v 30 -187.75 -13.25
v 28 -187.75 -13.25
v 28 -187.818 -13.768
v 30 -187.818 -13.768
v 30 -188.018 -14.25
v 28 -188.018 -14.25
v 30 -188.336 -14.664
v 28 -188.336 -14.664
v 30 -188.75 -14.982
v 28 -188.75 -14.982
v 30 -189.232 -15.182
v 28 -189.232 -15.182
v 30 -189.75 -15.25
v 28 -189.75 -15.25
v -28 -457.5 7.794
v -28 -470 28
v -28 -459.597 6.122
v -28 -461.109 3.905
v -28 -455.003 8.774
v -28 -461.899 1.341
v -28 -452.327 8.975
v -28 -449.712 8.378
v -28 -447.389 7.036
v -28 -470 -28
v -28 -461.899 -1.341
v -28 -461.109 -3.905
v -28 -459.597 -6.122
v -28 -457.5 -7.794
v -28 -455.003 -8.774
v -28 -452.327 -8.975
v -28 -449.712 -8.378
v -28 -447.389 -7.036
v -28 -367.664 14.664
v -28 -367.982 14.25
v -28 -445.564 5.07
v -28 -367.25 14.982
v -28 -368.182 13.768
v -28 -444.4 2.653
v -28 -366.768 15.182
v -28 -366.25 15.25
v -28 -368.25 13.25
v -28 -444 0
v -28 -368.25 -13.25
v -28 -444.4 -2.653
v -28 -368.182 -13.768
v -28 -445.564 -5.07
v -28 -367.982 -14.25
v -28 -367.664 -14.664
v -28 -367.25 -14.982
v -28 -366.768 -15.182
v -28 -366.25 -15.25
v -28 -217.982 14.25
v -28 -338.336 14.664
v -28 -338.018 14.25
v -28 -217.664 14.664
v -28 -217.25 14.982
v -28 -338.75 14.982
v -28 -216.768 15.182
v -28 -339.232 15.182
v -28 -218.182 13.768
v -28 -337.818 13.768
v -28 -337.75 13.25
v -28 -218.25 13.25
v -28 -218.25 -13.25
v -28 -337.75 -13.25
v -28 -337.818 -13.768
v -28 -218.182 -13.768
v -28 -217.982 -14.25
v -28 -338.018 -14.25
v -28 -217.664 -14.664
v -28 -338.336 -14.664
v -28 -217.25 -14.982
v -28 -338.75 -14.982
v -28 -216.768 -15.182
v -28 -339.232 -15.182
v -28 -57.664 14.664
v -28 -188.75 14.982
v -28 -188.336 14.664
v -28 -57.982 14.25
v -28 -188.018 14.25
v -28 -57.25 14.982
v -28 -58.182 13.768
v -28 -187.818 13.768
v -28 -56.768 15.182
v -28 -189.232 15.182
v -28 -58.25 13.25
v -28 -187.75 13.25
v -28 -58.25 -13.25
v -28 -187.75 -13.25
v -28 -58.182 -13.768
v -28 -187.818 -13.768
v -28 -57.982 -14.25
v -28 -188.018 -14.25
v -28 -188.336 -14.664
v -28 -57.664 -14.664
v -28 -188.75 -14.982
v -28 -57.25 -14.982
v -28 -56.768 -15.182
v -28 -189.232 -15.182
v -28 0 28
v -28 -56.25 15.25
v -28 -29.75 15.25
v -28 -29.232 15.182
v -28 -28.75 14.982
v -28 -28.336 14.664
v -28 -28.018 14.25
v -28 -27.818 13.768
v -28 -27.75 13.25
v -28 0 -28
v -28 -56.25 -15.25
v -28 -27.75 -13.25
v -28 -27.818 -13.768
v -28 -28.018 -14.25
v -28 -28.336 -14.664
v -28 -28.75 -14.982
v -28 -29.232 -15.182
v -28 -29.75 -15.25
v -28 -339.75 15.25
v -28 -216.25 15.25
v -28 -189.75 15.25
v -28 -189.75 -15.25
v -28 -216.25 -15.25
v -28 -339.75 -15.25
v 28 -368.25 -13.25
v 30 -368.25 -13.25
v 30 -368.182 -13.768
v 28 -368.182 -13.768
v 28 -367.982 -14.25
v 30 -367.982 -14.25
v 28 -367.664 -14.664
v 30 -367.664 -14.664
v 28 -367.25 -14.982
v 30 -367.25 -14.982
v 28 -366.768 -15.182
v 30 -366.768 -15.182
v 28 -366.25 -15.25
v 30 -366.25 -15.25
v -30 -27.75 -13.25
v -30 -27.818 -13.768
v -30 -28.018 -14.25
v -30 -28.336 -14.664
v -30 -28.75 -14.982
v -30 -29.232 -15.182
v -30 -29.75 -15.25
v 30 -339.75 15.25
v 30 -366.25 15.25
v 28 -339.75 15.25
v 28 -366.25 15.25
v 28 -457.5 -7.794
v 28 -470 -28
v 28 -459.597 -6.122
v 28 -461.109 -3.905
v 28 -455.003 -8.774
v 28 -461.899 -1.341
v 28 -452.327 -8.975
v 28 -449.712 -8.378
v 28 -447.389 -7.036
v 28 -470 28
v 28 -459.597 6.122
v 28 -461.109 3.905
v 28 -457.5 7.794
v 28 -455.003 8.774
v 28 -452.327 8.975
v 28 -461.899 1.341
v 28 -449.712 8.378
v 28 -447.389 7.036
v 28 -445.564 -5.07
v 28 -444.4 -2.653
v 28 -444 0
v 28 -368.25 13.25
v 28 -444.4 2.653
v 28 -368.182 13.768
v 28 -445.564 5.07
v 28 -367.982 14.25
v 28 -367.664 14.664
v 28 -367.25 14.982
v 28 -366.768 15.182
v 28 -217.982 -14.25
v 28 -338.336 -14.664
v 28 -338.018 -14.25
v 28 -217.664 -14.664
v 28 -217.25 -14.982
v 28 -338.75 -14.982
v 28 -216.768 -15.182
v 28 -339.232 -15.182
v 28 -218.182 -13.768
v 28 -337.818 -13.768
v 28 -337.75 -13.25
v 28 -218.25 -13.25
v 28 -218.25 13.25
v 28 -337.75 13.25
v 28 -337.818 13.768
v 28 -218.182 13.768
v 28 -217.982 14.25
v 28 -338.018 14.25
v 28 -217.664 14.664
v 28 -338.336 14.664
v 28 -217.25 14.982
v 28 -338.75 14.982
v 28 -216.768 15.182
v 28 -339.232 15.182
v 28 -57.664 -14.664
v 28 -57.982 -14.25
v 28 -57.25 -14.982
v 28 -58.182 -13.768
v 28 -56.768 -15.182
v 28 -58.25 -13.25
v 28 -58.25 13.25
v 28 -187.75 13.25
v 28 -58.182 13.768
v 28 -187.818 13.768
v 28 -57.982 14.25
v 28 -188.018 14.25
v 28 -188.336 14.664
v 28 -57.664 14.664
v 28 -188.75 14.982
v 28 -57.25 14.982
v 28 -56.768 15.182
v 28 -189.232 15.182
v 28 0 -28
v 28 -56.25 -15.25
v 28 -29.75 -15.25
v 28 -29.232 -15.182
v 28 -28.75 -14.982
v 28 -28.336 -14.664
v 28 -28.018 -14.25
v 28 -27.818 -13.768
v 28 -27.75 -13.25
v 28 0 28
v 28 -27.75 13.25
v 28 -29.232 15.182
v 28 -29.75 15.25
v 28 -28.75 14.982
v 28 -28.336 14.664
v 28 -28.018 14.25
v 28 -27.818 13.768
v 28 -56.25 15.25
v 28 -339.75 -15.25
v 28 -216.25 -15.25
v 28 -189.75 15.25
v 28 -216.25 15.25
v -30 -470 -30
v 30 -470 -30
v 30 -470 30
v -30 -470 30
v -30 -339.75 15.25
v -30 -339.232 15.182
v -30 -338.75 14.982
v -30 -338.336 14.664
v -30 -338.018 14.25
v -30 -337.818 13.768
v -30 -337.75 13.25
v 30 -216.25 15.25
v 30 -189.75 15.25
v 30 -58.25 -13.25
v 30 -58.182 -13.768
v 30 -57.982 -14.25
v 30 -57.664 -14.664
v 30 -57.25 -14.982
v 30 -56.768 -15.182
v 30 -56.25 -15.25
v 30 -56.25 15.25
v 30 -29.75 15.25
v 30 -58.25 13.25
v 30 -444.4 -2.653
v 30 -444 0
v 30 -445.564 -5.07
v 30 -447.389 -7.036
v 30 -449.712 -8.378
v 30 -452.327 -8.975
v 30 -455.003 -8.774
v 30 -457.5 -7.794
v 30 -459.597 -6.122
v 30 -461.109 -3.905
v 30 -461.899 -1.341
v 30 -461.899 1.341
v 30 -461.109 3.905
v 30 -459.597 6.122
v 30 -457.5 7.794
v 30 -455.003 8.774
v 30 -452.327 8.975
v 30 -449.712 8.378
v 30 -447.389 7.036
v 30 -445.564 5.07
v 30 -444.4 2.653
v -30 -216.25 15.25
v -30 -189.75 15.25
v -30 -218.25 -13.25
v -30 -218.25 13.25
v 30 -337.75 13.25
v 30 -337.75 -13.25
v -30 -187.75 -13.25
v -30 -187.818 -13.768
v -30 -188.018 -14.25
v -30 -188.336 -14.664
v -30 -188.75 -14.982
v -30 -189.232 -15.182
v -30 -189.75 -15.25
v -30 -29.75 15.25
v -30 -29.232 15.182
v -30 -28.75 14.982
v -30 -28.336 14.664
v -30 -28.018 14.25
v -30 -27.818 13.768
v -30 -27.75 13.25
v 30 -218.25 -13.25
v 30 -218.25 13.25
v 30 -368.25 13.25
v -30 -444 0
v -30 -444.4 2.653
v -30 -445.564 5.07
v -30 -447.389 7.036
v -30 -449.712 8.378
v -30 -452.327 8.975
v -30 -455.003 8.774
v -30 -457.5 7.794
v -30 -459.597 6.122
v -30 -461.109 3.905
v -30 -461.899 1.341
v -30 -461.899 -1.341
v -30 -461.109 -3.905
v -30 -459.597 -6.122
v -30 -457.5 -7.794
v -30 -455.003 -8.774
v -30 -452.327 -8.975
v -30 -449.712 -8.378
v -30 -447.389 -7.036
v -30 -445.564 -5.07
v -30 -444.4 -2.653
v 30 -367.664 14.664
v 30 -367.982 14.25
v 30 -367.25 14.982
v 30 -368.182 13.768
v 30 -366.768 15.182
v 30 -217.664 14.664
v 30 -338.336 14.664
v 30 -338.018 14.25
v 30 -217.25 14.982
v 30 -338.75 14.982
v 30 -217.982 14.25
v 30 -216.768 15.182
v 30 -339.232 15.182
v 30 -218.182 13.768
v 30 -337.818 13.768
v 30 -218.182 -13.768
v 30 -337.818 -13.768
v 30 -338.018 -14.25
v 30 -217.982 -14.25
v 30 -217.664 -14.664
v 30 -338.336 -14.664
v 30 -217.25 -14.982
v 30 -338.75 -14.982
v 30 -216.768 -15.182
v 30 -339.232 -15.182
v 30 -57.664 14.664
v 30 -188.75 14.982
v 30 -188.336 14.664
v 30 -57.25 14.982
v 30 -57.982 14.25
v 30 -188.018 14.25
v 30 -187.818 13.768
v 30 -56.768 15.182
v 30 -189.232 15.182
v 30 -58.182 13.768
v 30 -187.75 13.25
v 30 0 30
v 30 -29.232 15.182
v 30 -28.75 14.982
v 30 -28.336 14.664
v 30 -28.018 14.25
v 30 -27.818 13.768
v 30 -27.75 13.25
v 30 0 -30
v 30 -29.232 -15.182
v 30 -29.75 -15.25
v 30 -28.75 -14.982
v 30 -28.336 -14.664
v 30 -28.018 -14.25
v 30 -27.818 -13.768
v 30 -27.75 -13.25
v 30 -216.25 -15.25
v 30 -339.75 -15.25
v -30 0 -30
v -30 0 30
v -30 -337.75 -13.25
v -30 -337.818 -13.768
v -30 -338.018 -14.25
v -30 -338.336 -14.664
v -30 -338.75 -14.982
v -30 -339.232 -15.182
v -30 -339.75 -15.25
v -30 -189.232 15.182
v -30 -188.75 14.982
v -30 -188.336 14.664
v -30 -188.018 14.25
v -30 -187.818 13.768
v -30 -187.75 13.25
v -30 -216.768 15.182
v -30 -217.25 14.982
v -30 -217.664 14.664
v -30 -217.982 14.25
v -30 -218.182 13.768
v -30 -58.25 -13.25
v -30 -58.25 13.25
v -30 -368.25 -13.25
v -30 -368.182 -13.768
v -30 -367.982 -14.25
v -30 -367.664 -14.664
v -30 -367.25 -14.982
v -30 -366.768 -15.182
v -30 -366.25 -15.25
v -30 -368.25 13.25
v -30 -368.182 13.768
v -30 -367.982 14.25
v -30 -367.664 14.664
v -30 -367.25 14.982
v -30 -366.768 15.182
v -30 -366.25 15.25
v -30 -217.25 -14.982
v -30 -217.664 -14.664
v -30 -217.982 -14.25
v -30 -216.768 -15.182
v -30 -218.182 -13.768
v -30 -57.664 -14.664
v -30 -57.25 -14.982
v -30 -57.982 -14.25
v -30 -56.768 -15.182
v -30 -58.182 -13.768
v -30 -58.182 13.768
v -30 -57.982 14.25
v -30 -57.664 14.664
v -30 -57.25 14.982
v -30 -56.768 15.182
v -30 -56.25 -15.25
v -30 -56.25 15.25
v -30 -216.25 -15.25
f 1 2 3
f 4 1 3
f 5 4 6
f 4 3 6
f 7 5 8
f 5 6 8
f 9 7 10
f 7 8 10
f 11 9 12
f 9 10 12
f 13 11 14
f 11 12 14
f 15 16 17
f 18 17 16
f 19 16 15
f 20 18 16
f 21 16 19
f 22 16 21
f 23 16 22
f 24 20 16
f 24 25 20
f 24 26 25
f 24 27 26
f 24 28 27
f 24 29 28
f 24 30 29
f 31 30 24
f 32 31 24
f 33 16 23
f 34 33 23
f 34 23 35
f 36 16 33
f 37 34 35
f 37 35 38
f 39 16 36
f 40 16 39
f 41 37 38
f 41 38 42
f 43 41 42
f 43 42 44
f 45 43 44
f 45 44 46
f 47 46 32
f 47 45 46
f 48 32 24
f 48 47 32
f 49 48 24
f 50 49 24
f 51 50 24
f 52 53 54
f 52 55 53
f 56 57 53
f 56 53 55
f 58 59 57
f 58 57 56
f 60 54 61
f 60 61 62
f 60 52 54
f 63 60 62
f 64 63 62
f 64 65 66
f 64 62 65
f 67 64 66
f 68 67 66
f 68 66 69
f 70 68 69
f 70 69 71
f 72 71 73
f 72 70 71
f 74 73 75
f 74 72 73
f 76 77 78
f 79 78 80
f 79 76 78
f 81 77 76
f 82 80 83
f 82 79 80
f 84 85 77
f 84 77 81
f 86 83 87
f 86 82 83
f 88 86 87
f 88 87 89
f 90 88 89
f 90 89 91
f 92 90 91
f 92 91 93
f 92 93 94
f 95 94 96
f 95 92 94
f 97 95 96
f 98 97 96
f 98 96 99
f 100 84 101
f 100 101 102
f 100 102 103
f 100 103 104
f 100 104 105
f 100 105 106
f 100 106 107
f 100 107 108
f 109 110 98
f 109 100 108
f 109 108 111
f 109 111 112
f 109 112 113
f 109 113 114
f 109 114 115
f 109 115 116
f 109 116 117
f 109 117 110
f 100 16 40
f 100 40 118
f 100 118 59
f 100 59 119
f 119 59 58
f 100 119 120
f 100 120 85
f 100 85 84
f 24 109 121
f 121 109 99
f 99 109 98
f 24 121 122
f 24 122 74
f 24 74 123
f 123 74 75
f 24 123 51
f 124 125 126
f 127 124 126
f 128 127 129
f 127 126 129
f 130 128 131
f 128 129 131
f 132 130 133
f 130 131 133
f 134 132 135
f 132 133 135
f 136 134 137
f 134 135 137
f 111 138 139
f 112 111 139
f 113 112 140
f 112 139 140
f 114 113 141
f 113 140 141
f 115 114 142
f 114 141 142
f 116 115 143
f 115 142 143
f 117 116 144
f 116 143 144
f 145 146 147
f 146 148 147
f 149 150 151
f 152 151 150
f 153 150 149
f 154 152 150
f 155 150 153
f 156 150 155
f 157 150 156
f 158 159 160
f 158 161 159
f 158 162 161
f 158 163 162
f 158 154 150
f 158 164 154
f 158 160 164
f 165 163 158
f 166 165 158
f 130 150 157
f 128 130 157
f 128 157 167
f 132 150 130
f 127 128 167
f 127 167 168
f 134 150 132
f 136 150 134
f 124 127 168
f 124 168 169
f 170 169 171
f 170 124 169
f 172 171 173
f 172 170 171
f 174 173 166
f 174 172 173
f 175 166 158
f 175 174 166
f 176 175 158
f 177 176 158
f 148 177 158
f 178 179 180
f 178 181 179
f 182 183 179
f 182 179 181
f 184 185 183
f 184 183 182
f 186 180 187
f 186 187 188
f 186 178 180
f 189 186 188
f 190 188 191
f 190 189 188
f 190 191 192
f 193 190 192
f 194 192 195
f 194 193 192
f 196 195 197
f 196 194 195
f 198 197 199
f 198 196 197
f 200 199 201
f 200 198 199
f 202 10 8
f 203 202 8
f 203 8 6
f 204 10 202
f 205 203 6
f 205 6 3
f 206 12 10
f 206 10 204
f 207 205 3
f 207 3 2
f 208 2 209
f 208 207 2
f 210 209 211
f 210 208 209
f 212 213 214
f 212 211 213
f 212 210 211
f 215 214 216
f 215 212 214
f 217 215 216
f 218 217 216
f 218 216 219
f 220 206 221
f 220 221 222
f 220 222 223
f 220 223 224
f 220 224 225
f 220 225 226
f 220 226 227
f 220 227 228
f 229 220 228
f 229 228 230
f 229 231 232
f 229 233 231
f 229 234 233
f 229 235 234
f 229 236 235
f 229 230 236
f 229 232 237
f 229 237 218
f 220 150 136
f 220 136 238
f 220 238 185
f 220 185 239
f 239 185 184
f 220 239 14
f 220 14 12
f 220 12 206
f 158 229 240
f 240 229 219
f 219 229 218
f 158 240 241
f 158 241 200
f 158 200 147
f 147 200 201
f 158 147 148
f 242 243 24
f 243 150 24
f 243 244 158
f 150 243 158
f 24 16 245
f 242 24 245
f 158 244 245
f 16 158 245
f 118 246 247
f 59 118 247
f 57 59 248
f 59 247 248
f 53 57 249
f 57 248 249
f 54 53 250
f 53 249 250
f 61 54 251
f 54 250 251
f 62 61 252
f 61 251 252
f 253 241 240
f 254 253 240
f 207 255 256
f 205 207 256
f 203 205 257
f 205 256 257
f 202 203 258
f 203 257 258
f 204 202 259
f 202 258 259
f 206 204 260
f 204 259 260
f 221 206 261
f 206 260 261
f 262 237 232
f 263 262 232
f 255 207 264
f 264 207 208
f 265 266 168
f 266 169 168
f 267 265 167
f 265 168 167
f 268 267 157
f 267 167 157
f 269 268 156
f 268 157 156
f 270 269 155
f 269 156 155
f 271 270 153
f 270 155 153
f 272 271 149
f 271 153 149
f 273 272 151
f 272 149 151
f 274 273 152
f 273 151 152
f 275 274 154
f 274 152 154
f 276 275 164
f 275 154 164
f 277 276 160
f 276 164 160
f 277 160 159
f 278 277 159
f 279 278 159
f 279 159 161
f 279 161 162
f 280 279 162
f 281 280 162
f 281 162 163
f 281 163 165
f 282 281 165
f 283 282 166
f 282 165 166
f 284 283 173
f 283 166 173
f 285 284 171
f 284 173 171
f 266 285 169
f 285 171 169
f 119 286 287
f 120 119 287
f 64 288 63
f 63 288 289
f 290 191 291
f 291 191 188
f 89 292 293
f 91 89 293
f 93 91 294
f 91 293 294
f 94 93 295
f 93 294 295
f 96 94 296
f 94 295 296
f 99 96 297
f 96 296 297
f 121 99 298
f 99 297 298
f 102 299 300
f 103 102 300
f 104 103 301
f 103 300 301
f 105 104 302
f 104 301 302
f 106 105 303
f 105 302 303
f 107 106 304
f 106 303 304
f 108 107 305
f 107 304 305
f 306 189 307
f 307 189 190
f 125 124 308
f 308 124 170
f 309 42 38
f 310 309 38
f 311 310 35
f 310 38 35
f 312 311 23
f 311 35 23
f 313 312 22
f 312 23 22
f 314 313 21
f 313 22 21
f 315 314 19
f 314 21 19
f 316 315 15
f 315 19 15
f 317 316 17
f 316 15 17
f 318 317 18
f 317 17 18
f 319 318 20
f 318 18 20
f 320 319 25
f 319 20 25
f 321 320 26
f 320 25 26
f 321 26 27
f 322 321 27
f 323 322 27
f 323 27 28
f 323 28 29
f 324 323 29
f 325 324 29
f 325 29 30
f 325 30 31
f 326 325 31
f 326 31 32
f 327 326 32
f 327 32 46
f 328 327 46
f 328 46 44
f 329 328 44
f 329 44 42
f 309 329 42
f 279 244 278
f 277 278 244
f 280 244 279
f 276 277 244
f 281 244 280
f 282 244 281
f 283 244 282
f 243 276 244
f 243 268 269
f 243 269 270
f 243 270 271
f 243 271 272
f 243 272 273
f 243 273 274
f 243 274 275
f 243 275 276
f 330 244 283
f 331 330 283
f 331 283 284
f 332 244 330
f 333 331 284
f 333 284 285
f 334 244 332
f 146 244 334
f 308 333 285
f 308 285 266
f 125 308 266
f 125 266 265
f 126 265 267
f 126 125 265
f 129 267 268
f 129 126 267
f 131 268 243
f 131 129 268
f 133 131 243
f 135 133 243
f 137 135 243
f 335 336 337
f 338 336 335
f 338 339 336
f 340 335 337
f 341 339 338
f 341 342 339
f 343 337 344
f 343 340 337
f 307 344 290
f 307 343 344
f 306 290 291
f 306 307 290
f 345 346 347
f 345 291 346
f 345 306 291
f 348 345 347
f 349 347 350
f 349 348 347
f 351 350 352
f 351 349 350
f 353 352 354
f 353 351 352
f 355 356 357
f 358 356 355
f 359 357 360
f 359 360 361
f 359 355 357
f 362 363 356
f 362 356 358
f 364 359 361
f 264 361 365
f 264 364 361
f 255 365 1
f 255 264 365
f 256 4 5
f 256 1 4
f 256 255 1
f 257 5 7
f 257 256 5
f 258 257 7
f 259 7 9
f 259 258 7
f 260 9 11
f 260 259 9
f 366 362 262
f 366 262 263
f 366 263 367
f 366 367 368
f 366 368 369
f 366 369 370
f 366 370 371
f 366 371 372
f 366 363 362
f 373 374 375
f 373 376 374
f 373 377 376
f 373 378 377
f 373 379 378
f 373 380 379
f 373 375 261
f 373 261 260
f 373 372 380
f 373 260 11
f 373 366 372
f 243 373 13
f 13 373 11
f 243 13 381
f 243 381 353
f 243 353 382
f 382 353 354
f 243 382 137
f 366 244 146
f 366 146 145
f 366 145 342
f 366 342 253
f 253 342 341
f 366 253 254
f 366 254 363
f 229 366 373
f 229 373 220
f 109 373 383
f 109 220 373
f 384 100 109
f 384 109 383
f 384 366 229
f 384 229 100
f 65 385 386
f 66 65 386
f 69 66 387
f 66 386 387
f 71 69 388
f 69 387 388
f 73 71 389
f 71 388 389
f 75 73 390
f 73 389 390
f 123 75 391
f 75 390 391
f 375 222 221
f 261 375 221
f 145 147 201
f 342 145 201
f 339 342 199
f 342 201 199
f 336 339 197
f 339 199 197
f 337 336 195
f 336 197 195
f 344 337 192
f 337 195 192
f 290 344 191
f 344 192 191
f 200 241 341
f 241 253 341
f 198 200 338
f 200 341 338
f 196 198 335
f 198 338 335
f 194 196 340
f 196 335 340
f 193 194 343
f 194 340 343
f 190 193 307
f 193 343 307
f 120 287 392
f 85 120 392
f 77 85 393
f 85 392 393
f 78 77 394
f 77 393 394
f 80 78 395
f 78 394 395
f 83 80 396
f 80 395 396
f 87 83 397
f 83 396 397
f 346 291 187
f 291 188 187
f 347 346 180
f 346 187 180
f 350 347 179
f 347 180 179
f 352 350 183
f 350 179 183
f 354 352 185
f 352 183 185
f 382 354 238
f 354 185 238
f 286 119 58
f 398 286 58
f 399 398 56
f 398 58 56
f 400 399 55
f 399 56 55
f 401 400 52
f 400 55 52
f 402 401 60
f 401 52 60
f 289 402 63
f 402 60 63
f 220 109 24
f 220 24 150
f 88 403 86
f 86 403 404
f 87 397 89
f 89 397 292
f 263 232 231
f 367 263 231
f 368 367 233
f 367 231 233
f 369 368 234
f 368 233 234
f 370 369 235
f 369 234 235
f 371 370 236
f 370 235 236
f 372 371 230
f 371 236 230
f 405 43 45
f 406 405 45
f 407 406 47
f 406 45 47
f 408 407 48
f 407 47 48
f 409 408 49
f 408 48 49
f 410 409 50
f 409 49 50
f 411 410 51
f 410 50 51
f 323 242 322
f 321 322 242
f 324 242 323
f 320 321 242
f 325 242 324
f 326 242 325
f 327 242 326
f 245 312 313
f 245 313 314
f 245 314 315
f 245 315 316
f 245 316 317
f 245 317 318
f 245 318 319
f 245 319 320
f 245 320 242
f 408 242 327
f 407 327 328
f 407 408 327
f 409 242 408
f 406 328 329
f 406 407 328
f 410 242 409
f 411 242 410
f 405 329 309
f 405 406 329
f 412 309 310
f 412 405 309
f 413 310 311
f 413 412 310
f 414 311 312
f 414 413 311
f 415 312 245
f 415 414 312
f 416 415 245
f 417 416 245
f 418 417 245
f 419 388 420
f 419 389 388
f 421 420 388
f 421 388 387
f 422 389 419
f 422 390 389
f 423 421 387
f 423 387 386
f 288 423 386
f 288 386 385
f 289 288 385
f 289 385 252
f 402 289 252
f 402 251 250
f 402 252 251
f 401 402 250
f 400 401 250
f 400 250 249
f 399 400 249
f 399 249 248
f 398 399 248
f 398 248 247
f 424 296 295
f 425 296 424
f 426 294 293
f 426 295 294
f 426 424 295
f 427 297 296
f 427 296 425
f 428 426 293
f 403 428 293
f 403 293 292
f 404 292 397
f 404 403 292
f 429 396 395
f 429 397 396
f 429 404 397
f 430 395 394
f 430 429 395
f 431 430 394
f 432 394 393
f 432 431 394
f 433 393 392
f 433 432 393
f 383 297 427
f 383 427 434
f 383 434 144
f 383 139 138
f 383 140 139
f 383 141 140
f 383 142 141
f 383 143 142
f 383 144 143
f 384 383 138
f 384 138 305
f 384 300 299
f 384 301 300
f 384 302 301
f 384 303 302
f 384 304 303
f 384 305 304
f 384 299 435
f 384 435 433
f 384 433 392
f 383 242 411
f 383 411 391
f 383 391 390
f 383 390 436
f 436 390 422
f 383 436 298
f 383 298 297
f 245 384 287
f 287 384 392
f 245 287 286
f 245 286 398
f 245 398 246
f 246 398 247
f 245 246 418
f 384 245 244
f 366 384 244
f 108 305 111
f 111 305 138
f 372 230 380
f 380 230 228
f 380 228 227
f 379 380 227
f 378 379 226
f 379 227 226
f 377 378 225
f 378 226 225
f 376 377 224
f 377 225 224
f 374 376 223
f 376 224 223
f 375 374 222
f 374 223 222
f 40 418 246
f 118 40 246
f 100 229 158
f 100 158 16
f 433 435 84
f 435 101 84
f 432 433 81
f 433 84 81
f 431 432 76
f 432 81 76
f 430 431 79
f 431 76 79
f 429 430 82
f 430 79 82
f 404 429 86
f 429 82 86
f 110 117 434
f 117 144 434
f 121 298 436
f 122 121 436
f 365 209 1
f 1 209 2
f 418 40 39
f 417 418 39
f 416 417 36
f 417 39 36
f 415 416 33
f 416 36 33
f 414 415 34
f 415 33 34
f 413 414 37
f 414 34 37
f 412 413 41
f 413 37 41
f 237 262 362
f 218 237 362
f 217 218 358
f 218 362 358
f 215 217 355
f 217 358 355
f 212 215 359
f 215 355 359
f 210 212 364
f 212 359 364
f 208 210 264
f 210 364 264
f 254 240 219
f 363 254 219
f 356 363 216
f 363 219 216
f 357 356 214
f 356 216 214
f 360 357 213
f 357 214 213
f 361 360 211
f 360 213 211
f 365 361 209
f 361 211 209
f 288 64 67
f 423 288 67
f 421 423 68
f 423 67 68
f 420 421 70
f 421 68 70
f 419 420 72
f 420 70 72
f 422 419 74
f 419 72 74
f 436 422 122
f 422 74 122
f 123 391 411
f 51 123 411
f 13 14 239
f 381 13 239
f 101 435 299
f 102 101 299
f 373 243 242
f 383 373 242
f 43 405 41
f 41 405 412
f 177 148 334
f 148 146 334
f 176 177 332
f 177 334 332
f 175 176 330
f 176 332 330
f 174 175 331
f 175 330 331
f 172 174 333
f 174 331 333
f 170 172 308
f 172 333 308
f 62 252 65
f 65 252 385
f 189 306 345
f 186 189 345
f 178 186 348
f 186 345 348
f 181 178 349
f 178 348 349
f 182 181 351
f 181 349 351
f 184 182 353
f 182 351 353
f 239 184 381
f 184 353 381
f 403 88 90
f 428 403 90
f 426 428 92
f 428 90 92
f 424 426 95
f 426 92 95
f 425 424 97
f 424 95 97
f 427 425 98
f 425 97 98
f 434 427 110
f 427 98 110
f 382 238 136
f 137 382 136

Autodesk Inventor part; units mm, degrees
ref_plane "YZ Plane" through (0, 0, 0) normal (1, 0, 0) x (0, 1, 0)
ref_plane "XZ Plane" through (0, 0, 0) normal (0, 1, 0) x (-1, 0, 0)
ref_plane "XY Plane" through (0, 0, 0) normal (0, 0, 1) x (1, 0, 0)
sketch "Sketch9" plane through (0, 0, 0) normal (0, 1, 0) x (-1, 0, 0)
  line L0 (30, 30) -> (-30, 30)
  line L1 (-30, 30) -> (-30, -30)
  line L2 (-30, -30) -> (30, -30)
  line L3 (30, -30) -> (30, 30)
  line L4 (30, 30) -> (-30, -30) construction
  line L5 (-30, 30) -> (30, -30) construction
  line L6 (-28, 28) -> (28, 28)
  line L7 (28, 28) -> (28, -28)
  line L8 (28, -28) -> (-28, -28)
  line L9 (-28, -28) -> (-28, 28)
  point P0 (0, 0)
  dimension "d172" = 60
  dimension "d173" = 60
  dimension "d174" = 2
extrude "Extrusion3" add sketch "Sketch9" against normal blind 470
sketch "Sketch10" plane through (0, 0, 0) normal (1, 0, 0) x (0, 1, 0)
  line L0 (0, 30) -> (0, -30) construction
  line L1 (0, 30) -> (-470, 30) construction
  line L2 (-470, -30) -> (-470, 30) construction
  line L3 (0, -30) -> (-470, -30) construction
  line L4 (-58.25, 15.25) -> (-27.75, 15.25)
  line L5 (-27.75, 15.25) -> (-27.75, -15.25)
  line L6 (-27.75, -15.25) -> (-58.25, -15.25)
  line L7 (-58.25, -15.25) -> (-58.25, 15.25)
  line L8 (-58.25, 15.25) -> (-27.75, -15.25) construction
  line L9 (-27.75, 15.25) -> (-58.25, -15.25) construction
  line L10 (-218.25, 15.25) -> (-187.75, 15.25)
  line L11 (-187.75, 15.25) -> (-187.75, -15.25)
  line L12 (-187.75, -15.25) -> (-218.25, -15.25)
  line L13 (-218.25, -15.25) -> (-218.25, 15.25)
  line L14 (-218.25, 15.25) -> (-187.75, -15.25) construction
  line L15 (-187.75, 15.25) -> (-218.25, -15.25) construction
  line L16 (-368.25, 15.25) -> (-337.75, 15.25)
  line L17 (-337.75, 15.25) -> (-337.75, -15.25)
  line L18 (-337.75, -15.25) -> (-368.25, -15.25)
  line L19 (-368.25, -15.25) -> (-368.25, 15.25)
  line L20 (-368.25, 15.25) -> (-337.75, -15.25) construction
  line L21 (-337.75, 15.25) -> (-368.25, -15.25) construction
  circle A0 centre (-453, 0) radius 9
  line L22 (0, 0) -> (47, 0)
  point P0 (-43, 0)
  point P1 (-203, 0)
  point P2 (-353, 0)
  dimension "d177" = 30.5
  dimension "d178" = 30.5
  dimension "d181" = 47
  dimension "d182" = 90
  dimension "d183" = 250
  dimension "d184" = 400
  dimension "d185" = 500
  dimension "d186" = 18
extrude "Extrusion4" cut sketch "Sketch10" along normal through all both and the other way through all
sketch "Sketch11" plane through (30, 0, 30) normal (1, 0, 0) x (0, 0, -1)
  line L0 (45.25, -218.25) -> (14.75, -218.25) projected
  line L1 (14.75, -218.25) -> (14.75, -187.75) projected
  line L2 (14.75, -187.75) -> (45.25, -187.75) projected
  line L3 (45.25, -187.75) -> (45.25, -218.25) projected
  circle A0 centre (30, -453) radius 9 projected
  line L4 (45.25, -58.25) -> (14.75, -58.25) projected
  line L5 (14.75, -58.25) -> (14.75, -27.75) projected
  line L6 (14.75, -27.75) -> (45.25, -27.75) projected
  line L7 (45.25, -27.75) -> (45.25, -58.25) projected
  line L8 (45.25, -368.25) -> (14.75, -368.25) projected
  line L9 (14.75, -368.25) -> (14.75, -337.75) projected
  line L10 (14.75, -337.75) -> (45.25, -337.75) projected
  line L11 (45.25, -337.75) -> (45.25, -368.25) projected
  line L12 (0, 0) -> (60, 0) projected
  line L13 (0, 0) -> (0, -470) projected
  line L14 (60, -470) -> (0, -470) projected
  line L15 (60, 0) -> (60, -470) projected
  line L16 (45.25, -27.75) -> (14.75, -58.25)
  line L17 (45.25, -187.75) -> (14.75, -218.25)
  line L18 (45.25, -337.75) -> (14.75, -368.25)
  point P0 (30, 0)
sketch "Sketch13" plane through (-30, 0, -30) normal (-1, 0, 0) x (0, 0, 1)
  line L0 (45.25, -218.25) -> (14.75, -218.25) projected
  line L1 (14.75, -218.25) -> (14.75, -187.75) projected
  line L2 (14.75, -187.75) -> (45.25, -187.75) projected
  line L3 (45.25, -187.75) -> (45.25, -218.25) projected
  circle A0 centre (30, -453) radius 9 projected
  line L4 (45.25, -58.25) -> (14.75, -58.25) projected
  line L5 (14.75, -58.25) -> (14.75, -27.75) projected
  line L6 (14.75, -27.75) -> (45.25, -27.75) projected
  line L7 (45.25, -27.75) -> (45.25, -58.25) projected
  line L8 (45.25, -368.25) -> (14.75, -368.25) projected
  line L9 (14.75, -368.25) -> (14.75, -337.75) projected
  line L10 (14.75, -337.75) -> (45.25, -337.75) projected
  line L11 (45.25, -337.75) -> (45.25, -368.25) projected
  line L12 (0, 0) -> (60, 0) projected
  line L13 (0, 0) -> (0, -470) projected
  line L14 (60, -470) -> (0, -470) projected
  line L15 (60, 0) -> (60, -470) projected
  line L16 (14.75, -58.25) -> (45.25, -27.75)
  line L17 (14.75, -218.25) -> (45.25, -187.75)
  line L18 (14.75, -368.25) -> (45.25, -337.75)
  point P0 (30, 0)
fillet "Fillet1" radius 2 24 edges at (29, -337.75, -15.25) (29, -337.75, 15.25) (29, -368.25, 15.25) (29, -368.25, -15.25) (29, -218.25, -15.25) (29, -218.25, 15.25) (29, -187.75, 15.25) (29, -187.75, -15.25) (29, -58.25, 15.25) (29, -27.75, 15.25) (29, -27.75, -15.25) (29, -58.25, -15.25) (-29, -58.25, 15.25) (-29, -27.75, 15.25) (-29, -27.75, -15.25) (-29, -58.25, -15.25) (-29, -187.75, 15.25) (-29, -218.25, 15.25) (-29, -218.25, -15.25) (-29, -187.75, -15.25) (-29, -337.75, 15.25) (-29, -368.25, 15.25) (-29, -337.75, -15.25) (-29, -368.25, -15.25)
properties part number "TZS 753 FDS 1200 FLANGE 3" material "Stainless Steel"
